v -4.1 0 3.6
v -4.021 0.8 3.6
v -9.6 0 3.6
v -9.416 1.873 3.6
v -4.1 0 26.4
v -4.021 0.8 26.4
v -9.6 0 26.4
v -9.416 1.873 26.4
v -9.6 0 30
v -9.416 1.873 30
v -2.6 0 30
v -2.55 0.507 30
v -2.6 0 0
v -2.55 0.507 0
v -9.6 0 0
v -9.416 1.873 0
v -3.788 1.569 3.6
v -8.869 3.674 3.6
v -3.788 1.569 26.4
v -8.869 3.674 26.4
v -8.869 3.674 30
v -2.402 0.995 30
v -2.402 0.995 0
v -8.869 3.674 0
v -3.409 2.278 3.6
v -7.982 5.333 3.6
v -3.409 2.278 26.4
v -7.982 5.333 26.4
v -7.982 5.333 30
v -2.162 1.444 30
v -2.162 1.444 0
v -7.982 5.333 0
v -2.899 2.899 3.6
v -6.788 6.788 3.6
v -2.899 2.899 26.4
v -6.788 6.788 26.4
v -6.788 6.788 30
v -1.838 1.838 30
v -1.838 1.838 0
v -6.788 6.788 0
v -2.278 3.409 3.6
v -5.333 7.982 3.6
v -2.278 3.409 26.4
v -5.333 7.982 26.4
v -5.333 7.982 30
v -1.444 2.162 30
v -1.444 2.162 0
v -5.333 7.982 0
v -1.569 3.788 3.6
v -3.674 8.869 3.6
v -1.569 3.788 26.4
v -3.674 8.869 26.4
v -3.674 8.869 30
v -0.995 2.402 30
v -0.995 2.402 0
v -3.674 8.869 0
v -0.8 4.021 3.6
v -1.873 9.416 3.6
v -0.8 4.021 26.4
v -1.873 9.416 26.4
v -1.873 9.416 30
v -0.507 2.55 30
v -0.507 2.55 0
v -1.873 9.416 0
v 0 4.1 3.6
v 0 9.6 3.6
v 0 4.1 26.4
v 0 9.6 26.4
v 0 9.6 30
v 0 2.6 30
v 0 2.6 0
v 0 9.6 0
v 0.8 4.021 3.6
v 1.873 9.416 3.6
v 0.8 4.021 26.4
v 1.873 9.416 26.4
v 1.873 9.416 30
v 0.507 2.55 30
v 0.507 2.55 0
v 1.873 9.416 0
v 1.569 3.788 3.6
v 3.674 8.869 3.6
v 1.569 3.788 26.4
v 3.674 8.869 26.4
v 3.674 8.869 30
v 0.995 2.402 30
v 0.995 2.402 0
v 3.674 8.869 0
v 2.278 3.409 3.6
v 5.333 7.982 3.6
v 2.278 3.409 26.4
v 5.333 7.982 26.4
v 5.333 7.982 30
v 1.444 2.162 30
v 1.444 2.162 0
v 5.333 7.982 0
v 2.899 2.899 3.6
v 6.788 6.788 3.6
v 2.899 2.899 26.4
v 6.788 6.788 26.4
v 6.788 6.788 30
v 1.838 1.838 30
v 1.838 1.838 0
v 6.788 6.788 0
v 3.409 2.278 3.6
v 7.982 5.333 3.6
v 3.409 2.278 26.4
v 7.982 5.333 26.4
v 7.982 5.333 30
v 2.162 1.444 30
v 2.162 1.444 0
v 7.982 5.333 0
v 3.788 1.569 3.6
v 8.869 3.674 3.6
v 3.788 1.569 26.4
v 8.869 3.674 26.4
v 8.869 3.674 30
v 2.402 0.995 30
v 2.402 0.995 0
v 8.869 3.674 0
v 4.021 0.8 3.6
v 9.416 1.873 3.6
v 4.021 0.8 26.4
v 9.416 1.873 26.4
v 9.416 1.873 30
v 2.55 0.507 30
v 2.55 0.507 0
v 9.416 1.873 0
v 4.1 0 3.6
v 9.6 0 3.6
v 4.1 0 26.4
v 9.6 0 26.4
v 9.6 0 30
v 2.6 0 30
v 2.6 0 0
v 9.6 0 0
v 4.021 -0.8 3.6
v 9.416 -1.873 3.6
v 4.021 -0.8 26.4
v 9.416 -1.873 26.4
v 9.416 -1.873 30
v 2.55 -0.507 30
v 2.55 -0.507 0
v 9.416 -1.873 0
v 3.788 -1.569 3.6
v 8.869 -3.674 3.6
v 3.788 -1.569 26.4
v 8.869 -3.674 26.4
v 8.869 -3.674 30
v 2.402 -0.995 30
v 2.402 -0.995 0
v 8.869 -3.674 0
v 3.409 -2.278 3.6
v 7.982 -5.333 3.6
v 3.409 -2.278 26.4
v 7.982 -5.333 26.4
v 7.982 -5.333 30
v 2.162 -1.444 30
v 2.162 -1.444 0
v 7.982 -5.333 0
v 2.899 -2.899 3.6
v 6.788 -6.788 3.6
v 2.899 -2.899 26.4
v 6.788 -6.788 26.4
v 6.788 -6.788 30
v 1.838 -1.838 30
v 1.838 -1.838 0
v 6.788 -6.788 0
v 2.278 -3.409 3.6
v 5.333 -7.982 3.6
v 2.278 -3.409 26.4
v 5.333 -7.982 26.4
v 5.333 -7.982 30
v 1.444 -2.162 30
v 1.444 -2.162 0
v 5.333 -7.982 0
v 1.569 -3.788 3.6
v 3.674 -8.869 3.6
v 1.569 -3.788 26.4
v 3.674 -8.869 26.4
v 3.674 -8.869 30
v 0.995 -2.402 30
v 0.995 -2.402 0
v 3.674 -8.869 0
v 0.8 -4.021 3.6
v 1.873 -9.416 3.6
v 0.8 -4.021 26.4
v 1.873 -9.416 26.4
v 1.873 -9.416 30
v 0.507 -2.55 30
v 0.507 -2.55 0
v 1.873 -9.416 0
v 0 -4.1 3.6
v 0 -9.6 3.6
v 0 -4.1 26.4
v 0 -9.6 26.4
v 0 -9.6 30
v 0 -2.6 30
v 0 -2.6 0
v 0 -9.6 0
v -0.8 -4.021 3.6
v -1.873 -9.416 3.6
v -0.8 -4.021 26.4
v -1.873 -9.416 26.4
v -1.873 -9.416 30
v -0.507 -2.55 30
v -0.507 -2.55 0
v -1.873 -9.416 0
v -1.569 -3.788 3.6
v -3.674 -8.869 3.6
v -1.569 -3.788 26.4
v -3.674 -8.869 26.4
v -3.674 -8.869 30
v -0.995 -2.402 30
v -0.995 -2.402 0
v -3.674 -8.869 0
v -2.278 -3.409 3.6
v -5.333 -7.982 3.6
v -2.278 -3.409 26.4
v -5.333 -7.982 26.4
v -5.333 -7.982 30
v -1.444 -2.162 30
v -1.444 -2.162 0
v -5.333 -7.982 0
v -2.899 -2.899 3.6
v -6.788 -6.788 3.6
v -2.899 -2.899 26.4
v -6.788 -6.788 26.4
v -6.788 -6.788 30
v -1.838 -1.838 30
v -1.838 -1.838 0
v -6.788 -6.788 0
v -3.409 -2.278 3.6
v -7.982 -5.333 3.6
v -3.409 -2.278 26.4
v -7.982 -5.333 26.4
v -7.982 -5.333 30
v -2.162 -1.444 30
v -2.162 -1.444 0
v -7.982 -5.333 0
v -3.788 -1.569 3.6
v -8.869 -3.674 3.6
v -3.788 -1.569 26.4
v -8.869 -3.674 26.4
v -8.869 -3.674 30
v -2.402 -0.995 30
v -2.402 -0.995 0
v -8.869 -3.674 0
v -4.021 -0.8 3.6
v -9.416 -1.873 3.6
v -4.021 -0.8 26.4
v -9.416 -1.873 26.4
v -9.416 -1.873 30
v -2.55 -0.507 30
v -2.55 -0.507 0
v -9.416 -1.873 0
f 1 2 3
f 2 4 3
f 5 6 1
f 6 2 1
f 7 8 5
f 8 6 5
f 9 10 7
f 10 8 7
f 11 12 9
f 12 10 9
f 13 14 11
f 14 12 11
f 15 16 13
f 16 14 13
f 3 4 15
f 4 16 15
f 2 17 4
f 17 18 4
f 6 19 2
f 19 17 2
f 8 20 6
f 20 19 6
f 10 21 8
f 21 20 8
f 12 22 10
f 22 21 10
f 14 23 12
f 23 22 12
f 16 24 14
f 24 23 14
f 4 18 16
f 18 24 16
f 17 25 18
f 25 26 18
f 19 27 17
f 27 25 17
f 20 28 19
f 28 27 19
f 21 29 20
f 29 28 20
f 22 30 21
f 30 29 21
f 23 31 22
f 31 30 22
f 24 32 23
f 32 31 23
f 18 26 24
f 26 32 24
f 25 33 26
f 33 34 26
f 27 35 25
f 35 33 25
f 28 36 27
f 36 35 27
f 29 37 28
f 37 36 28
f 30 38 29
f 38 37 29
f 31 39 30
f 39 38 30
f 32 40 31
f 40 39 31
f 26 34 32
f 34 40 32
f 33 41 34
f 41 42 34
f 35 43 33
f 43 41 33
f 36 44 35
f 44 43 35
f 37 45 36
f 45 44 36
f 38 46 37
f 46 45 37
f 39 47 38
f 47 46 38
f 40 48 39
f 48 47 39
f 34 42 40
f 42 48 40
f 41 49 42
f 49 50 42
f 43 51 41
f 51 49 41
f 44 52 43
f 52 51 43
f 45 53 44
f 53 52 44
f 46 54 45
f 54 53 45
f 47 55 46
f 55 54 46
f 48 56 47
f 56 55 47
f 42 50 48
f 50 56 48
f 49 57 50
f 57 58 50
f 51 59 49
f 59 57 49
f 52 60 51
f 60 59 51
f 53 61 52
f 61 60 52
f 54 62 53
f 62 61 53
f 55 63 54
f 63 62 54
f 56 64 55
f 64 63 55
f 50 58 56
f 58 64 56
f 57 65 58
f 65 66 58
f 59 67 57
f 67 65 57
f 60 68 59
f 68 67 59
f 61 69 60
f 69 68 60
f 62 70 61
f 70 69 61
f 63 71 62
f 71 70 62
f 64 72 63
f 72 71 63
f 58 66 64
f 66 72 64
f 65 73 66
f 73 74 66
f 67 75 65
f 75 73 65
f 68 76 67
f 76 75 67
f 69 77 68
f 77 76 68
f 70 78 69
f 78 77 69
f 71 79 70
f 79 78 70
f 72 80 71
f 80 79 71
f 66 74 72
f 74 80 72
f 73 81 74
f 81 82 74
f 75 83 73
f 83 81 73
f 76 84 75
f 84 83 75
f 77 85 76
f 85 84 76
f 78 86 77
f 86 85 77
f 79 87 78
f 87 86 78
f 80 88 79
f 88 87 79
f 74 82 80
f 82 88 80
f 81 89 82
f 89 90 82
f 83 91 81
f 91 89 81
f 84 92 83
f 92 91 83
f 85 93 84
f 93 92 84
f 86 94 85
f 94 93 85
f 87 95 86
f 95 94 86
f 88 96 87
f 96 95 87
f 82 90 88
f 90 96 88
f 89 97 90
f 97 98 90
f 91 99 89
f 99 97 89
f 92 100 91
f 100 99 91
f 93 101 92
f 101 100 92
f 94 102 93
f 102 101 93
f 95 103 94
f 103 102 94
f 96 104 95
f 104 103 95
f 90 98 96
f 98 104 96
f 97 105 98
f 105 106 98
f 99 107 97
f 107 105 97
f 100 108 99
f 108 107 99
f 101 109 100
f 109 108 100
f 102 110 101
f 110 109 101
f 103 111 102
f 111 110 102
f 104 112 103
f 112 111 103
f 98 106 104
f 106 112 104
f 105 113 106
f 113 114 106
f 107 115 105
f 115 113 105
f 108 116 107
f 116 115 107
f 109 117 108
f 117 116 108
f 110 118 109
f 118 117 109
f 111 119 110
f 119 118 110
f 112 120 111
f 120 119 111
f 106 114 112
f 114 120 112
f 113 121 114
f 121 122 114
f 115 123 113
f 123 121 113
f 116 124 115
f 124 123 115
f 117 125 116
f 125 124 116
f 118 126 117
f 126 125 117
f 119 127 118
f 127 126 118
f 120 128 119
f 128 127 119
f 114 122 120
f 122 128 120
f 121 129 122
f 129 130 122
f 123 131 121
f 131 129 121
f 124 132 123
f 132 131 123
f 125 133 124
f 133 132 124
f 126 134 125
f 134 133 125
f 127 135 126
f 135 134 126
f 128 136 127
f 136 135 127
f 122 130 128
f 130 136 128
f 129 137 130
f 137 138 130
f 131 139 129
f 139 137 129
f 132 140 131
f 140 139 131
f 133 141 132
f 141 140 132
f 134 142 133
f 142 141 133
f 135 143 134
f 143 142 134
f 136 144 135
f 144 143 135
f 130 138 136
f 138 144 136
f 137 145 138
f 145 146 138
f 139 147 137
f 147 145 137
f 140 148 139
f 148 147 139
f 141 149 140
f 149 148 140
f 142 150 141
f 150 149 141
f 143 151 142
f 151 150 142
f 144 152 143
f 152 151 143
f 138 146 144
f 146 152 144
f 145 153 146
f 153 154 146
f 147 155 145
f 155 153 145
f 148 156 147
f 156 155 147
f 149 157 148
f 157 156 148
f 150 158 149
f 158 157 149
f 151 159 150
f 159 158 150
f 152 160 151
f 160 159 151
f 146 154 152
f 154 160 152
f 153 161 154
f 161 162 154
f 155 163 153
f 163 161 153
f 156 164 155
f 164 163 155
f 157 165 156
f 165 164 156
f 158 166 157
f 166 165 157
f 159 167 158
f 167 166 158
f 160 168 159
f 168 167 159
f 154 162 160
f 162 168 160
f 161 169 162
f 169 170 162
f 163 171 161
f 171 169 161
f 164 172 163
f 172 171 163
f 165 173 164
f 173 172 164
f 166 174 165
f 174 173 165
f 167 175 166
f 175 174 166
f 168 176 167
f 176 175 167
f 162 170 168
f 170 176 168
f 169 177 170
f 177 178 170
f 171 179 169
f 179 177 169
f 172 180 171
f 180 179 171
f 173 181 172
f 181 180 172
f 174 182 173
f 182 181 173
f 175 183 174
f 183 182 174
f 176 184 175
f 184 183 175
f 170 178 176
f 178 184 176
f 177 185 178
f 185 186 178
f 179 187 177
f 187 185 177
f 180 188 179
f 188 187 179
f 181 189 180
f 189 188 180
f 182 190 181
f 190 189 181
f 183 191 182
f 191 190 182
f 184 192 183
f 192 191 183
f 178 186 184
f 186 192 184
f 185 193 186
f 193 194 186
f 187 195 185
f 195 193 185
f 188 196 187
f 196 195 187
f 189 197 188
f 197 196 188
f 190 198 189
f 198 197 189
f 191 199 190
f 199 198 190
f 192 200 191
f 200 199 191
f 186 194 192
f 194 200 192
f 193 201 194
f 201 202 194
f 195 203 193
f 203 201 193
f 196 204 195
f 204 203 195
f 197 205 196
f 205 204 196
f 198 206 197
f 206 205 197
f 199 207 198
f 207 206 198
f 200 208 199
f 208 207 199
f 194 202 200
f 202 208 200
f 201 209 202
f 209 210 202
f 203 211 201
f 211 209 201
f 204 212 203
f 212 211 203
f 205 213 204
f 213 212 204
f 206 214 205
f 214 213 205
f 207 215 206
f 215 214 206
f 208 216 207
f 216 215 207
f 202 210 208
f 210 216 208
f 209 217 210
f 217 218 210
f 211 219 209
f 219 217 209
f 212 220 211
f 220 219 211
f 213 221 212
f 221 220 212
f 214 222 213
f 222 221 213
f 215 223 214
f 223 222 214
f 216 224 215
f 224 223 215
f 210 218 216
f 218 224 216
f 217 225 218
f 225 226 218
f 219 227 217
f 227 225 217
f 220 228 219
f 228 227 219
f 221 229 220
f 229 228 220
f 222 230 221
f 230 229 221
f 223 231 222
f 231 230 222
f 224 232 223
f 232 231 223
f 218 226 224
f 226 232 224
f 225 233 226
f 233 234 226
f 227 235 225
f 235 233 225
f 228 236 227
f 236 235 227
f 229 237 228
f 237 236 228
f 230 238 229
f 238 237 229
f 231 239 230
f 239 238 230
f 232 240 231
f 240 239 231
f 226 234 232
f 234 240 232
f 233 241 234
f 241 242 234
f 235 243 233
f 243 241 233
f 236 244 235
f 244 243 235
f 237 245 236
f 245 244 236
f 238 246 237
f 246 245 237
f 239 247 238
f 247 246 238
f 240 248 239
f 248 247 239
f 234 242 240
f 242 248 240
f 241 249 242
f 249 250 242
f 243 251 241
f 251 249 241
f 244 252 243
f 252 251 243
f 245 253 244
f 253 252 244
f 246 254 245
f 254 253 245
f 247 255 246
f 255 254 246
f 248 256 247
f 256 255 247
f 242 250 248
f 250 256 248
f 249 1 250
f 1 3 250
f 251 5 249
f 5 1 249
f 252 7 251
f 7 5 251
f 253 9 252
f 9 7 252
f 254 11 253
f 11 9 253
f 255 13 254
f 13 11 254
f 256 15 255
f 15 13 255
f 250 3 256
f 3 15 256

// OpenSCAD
$fn = 32;

// ----------------------------------------------------------------------
// Profiled standoff: spool spacer, 30 mm long, bore 5.2 mm
// ----------------------------------------------------------------------

// --- parameters (mm) ---
revolve_angle = 360;      // full turn around the Z axis
profile_points = 8;       // points of the closed outline

profile = [[2.6, 0], [9.6, 0], [9.6, 3.6], [4.1, 3.6], [4.1, 26.4], [9.6, 26.4], [9.6, 30], [2.6, 30]];  // single closed polygon, 8 points, counter clockwise

// --- the one profile operation ---
rotate_extrude(angle = revolve_angle) polygon(points = profile);
